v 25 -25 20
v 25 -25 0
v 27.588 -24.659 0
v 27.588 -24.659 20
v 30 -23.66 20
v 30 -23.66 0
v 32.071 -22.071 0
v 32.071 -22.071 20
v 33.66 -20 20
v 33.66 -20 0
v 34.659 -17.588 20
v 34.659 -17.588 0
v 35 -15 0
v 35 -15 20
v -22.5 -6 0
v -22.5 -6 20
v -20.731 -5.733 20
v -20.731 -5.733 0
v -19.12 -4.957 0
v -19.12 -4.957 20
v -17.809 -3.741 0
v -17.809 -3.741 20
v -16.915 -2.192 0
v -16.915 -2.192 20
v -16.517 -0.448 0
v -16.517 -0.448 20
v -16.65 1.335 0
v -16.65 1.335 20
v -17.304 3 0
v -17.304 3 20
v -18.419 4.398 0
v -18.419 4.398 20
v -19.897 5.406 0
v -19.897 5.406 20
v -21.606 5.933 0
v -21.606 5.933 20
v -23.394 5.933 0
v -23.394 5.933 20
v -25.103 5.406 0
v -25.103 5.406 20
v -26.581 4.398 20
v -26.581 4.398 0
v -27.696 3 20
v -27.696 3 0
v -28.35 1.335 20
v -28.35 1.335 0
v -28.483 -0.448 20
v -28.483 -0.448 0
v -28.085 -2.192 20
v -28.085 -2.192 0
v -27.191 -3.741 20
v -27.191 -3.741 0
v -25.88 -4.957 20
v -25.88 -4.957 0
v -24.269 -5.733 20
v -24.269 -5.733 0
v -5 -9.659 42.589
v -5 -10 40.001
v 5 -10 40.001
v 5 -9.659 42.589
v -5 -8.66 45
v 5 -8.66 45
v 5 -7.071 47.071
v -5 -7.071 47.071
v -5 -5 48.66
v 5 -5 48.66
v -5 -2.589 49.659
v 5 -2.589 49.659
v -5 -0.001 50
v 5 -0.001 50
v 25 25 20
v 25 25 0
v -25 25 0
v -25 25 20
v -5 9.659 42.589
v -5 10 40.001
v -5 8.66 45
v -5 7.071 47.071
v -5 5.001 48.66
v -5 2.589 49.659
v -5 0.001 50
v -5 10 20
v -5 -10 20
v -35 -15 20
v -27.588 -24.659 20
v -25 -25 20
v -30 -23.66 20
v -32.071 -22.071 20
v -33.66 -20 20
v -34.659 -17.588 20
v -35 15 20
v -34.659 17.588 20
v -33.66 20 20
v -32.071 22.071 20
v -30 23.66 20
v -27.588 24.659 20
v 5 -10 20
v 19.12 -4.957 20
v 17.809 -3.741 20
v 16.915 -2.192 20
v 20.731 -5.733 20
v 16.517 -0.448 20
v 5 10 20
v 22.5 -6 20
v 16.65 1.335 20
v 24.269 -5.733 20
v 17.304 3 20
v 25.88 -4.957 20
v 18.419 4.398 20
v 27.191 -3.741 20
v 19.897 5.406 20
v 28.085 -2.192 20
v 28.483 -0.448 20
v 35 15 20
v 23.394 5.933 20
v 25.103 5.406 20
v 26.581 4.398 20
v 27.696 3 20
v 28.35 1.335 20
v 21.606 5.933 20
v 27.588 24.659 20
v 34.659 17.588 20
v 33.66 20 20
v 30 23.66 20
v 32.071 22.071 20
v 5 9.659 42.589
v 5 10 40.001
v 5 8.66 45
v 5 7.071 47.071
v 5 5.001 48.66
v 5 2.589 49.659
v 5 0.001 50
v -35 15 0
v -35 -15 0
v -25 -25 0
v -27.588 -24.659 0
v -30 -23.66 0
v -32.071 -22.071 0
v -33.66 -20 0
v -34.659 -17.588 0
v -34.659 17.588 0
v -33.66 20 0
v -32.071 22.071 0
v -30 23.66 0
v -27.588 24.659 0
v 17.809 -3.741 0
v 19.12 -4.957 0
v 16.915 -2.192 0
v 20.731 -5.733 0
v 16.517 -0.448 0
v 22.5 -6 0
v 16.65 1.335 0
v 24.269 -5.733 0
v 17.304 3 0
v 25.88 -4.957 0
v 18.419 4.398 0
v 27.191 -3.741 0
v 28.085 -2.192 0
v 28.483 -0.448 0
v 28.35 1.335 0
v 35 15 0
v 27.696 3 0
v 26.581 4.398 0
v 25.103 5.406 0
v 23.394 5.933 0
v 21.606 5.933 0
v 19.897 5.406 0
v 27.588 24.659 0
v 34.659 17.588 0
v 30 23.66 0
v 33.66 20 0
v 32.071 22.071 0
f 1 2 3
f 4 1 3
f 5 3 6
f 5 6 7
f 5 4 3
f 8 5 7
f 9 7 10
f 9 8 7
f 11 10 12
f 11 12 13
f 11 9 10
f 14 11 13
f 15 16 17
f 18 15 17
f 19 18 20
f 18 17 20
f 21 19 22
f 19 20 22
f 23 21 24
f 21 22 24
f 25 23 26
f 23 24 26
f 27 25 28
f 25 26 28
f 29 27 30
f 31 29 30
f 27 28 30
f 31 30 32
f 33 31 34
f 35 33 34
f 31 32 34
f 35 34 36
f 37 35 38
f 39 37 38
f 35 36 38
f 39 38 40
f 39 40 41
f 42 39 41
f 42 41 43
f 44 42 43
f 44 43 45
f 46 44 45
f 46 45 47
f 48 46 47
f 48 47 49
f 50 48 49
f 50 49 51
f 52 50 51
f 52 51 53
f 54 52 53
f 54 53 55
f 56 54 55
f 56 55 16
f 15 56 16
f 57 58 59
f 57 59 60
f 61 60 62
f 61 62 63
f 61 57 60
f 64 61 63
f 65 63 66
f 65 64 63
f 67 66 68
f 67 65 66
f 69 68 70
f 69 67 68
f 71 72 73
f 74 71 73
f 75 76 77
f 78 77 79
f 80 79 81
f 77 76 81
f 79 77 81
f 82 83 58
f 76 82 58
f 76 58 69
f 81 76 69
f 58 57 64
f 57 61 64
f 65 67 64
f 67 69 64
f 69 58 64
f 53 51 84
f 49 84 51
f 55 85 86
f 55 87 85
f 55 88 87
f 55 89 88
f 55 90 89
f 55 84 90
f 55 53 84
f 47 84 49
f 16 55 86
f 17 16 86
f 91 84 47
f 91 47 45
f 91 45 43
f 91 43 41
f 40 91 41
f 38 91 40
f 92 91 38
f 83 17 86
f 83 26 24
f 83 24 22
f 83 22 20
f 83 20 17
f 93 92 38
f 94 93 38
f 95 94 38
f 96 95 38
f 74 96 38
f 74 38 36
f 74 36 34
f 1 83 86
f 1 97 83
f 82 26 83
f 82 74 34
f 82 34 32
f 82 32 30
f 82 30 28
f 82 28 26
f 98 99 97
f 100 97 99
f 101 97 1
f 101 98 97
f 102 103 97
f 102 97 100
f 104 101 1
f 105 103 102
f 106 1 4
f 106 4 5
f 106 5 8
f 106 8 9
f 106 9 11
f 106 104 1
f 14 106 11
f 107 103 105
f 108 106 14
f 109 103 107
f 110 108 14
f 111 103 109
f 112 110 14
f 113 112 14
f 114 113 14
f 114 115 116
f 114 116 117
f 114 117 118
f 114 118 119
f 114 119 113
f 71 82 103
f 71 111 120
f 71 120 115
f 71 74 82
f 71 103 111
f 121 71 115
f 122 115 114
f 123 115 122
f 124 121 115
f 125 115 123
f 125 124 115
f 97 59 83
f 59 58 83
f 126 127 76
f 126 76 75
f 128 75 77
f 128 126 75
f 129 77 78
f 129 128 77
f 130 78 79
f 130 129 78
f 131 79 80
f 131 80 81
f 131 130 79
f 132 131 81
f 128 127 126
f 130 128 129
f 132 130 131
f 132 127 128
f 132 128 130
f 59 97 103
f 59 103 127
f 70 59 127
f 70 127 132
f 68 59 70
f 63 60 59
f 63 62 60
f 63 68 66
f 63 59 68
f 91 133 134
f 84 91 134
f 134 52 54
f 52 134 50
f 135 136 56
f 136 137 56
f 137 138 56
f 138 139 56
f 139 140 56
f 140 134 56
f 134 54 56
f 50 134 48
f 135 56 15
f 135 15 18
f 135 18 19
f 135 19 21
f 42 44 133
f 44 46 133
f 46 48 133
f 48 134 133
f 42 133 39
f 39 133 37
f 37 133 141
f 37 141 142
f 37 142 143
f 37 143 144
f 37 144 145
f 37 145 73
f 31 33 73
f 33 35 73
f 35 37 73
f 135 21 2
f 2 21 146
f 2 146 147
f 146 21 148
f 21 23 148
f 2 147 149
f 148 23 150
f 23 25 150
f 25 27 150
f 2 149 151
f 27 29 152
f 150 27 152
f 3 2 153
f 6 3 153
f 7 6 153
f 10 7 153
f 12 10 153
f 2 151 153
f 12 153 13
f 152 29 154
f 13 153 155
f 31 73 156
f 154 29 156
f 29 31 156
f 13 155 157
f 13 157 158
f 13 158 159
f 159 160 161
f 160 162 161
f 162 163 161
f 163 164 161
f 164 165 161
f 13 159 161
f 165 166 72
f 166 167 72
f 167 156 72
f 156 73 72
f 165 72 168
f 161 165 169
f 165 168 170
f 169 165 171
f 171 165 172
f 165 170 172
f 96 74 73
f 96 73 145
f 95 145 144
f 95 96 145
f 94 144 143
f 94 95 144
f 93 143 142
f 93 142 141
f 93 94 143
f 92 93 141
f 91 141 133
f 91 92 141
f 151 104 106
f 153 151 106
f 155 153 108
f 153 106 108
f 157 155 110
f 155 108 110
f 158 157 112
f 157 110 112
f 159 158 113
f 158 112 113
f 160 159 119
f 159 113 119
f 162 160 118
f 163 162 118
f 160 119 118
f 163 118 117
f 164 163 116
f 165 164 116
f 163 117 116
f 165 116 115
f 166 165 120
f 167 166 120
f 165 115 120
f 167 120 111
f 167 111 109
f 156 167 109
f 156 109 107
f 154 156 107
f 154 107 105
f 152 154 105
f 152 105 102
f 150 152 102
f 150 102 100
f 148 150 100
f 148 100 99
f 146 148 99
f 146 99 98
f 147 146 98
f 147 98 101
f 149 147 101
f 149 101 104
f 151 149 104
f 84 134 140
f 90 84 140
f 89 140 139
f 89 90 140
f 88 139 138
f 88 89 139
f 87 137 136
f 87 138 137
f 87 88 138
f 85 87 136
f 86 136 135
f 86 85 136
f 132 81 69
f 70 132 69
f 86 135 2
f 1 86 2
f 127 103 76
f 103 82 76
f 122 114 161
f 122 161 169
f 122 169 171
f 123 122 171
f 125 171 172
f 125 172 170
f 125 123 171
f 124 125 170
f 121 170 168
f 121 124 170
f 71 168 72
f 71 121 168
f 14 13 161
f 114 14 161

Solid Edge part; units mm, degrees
sketch "Sketch1" plane through (0, 0, 0) normal (0, 0, 1) x (1, 0, 0)
  line L0 (-35, -25) -> (35, -25)
  line L1 (35, -25) -> (35, 25)
  line L2 (35, 25) -> (-35, 25)
  line L3 (-35, 25) -> (-35, -25)
  dimension "D1" = 70
  dimension "D2" = 50
extrude "Protrusion1" add sketch "Sketch1" along normal blind 20
fillet "Round1" radius 10 4 edges at (-35, -25, 10) (-35, 25, 10) (35, -25, 10) (35, 25, 10)
hole "Hole1" at (-22.5, 0, 20) direction (0, 0, -1) diameter 12 end up to next
hole "Hole2" at (22.5, 0, 20) direction (0, 0, -1) diameter 12 end up to next
sketch "Sketch2" plane through (0, 0, 0) normal (1, 0, 0) x (0, 1, 0)
  line L0 (-10, 20) -> (10, 20)
  line L1 (10, 20) -> (10, 50)
  line L2 (10, 50) -> (-10, 50)
  line L3 (-10, 50) -> (-10, 20)
  dimension "D1" = 20
  dimension "D2" = 30
extrude "Protrusion2" add sketch "Sketch2" along normal mid plane 10
fillet "Round2" radius 10 2 edges at (0, -10, 50) (0, 10, 50)
properties material "알루미늄, 1060"
